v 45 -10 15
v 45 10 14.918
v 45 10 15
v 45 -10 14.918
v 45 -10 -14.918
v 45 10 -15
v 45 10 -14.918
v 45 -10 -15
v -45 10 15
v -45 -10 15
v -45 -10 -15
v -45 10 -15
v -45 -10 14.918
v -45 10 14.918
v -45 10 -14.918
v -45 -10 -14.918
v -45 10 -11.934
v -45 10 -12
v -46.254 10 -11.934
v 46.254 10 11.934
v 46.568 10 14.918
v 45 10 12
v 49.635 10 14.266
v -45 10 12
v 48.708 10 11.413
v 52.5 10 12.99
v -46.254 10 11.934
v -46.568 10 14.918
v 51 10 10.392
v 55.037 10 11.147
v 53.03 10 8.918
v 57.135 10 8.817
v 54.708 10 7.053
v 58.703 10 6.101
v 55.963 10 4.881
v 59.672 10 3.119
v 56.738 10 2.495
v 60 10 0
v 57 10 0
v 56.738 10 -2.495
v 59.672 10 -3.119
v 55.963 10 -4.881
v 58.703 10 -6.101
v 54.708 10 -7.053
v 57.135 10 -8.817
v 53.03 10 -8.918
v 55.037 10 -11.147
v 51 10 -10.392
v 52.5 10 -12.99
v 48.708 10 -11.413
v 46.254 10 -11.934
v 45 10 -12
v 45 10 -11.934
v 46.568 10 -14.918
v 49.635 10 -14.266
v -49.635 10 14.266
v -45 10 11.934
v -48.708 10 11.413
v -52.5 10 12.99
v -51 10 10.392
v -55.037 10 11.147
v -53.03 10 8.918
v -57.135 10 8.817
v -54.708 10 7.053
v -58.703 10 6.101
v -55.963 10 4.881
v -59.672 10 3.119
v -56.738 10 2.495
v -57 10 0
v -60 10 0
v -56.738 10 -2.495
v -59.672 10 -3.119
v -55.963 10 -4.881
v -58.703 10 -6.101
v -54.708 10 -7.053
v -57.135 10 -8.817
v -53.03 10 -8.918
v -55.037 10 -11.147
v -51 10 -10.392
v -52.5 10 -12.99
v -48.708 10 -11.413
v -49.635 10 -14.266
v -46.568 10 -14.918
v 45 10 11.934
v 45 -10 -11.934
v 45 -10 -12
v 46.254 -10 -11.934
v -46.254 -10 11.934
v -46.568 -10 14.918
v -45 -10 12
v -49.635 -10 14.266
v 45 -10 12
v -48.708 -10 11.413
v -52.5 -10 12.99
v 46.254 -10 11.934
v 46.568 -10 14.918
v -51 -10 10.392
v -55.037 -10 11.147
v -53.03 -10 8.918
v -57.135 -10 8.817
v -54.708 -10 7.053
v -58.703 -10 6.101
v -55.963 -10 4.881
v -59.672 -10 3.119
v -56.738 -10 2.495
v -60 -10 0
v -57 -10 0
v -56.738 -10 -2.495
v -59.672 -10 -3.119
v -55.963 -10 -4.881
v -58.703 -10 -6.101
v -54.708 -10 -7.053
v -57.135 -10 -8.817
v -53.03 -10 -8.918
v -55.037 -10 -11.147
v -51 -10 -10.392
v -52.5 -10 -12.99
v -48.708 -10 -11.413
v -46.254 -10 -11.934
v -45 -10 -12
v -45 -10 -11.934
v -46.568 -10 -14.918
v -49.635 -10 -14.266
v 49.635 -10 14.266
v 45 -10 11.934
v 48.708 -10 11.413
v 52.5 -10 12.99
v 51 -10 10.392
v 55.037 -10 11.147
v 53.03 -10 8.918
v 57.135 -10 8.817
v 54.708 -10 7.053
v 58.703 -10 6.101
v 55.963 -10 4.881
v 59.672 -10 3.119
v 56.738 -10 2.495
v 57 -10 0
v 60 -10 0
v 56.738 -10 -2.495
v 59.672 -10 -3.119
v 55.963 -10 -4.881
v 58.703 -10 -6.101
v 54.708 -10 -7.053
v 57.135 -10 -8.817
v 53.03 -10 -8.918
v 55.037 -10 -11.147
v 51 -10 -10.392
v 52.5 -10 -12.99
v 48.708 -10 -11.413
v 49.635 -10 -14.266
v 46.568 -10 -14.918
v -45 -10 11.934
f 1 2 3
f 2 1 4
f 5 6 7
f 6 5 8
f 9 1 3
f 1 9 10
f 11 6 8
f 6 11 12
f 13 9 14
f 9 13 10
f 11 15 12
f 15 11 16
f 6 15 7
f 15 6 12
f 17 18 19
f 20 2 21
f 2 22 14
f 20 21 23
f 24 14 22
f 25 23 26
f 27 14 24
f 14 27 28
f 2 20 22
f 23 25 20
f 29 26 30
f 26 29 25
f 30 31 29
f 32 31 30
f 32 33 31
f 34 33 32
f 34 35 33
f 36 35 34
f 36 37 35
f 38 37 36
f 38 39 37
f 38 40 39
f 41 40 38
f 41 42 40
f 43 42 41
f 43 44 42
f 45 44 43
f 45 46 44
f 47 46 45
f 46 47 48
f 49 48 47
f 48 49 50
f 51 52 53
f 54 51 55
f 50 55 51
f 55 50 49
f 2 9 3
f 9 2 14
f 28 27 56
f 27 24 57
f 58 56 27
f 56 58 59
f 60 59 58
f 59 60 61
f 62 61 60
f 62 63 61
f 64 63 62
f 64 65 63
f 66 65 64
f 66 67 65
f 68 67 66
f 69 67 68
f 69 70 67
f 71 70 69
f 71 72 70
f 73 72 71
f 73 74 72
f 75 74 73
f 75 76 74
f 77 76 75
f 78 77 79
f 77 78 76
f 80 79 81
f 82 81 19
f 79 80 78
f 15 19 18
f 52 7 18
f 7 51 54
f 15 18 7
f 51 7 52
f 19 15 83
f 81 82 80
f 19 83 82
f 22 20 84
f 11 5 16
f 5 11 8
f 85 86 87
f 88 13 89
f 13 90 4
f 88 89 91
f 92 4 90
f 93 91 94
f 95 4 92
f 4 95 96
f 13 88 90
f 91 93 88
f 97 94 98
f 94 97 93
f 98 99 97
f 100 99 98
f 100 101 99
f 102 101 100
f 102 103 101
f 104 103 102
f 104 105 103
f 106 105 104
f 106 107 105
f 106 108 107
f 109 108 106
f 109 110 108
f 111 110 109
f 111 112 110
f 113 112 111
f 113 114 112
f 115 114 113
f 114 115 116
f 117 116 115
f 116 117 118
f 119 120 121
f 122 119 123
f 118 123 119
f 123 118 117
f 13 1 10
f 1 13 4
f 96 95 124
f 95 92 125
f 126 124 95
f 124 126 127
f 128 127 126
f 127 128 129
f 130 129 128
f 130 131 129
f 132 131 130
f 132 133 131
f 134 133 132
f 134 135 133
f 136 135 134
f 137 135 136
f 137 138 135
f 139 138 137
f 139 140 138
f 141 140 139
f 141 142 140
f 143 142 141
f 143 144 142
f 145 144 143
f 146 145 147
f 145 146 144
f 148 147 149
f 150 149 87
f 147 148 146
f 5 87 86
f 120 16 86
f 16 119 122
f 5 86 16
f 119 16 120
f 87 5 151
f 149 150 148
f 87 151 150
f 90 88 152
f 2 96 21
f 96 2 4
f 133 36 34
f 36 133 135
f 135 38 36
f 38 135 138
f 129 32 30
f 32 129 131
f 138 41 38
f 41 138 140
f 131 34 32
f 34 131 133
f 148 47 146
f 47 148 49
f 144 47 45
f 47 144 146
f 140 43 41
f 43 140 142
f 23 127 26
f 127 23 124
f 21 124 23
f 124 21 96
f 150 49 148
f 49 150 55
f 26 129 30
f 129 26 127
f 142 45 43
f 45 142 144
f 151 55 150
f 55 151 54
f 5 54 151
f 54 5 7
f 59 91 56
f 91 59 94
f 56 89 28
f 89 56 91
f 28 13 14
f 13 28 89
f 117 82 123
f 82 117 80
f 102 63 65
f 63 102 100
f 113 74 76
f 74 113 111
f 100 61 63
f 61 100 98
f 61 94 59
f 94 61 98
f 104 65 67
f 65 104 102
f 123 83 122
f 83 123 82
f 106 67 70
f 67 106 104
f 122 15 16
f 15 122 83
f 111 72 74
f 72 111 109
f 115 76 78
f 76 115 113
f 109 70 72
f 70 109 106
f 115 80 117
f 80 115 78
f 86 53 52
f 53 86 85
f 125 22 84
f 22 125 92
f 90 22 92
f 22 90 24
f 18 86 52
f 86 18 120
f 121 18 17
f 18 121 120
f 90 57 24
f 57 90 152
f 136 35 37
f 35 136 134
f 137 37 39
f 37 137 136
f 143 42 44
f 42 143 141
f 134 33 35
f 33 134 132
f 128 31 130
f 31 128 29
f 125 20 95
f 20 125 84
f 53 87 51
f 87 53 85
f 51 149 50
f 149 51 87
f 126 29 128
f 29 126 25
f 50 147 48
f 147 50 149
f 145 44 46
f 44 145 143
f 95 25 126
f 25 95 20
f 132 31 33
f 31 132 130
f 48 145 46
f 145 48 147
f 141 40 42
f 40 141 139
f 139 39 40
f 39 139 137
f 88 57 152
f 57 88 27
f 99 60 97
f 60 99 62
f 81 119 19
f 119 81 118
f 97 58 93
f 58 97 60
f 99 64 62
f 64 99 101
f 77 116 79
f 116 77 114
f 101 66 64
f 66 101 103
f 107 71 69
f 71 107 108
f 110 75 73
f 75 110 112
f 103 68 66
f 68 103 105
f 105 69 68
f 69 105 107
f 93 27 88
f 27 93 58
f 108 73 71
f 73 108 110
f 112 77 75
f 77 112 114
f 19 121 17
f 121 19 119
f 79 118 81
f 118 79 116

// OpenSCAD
// Simple Tank Model in OpenSCAD

// Tank dimensions
tank_length = 100;
tank_width = 60;
tank_height = 30;
turret_diameter = 40;
turret_height = 20;
barrel_length = 50;
barrel_diameter = 5;


module track(track_length,track_width,track_height){
     cube( [ track_length, track_width, track_height ], true );
     translate([ track_length/2, track_width / 2, 0 ] )
        wheel(track_width,track_height);
     translate([ -track_length/2, track_width / 2, 0 ] )
        wheel(track_width,track_height);
}

module wheel( track_width,track_height){
         rotate([90, 0, 0]){
         cylinder( h = track_width, r = track_height/2 );
    } 
}

// Tracks
module tracks() {
    track_width = 10;
    track_height = tank_height / 2;
    track_length = tank_length * 0.9;

    translate( [ 0, -tank_width / 2, 0 ] )
        track( track_length,track_width,track_height);

    translate( [ 0, tank_width / 2, 0] )
       track(track_length,track_width,track_height);
}


module track_left(){
    track_width = 10;
    track_height = tank_height / 1.5;
    track_length = tank_length * 0.9;
    
    translate( [ 0, -tank_width / 2, 0 ] )
        track( track_length, track_width, track_height );
}

module fulltrack( w, h, l ){
    track_width = w;
    track_height = h;
    track_length = l;

    //translate( [ 0, w / 2, 0 ] )
    difference(){
    track( track_length,track_width,tank_height );
    track( track_length,track_width + 1,tank_height * 0.8 );
    }
} 


fulltrack( 20, tank_height / 1.5, tank_length * 0.9);
//track_right();
